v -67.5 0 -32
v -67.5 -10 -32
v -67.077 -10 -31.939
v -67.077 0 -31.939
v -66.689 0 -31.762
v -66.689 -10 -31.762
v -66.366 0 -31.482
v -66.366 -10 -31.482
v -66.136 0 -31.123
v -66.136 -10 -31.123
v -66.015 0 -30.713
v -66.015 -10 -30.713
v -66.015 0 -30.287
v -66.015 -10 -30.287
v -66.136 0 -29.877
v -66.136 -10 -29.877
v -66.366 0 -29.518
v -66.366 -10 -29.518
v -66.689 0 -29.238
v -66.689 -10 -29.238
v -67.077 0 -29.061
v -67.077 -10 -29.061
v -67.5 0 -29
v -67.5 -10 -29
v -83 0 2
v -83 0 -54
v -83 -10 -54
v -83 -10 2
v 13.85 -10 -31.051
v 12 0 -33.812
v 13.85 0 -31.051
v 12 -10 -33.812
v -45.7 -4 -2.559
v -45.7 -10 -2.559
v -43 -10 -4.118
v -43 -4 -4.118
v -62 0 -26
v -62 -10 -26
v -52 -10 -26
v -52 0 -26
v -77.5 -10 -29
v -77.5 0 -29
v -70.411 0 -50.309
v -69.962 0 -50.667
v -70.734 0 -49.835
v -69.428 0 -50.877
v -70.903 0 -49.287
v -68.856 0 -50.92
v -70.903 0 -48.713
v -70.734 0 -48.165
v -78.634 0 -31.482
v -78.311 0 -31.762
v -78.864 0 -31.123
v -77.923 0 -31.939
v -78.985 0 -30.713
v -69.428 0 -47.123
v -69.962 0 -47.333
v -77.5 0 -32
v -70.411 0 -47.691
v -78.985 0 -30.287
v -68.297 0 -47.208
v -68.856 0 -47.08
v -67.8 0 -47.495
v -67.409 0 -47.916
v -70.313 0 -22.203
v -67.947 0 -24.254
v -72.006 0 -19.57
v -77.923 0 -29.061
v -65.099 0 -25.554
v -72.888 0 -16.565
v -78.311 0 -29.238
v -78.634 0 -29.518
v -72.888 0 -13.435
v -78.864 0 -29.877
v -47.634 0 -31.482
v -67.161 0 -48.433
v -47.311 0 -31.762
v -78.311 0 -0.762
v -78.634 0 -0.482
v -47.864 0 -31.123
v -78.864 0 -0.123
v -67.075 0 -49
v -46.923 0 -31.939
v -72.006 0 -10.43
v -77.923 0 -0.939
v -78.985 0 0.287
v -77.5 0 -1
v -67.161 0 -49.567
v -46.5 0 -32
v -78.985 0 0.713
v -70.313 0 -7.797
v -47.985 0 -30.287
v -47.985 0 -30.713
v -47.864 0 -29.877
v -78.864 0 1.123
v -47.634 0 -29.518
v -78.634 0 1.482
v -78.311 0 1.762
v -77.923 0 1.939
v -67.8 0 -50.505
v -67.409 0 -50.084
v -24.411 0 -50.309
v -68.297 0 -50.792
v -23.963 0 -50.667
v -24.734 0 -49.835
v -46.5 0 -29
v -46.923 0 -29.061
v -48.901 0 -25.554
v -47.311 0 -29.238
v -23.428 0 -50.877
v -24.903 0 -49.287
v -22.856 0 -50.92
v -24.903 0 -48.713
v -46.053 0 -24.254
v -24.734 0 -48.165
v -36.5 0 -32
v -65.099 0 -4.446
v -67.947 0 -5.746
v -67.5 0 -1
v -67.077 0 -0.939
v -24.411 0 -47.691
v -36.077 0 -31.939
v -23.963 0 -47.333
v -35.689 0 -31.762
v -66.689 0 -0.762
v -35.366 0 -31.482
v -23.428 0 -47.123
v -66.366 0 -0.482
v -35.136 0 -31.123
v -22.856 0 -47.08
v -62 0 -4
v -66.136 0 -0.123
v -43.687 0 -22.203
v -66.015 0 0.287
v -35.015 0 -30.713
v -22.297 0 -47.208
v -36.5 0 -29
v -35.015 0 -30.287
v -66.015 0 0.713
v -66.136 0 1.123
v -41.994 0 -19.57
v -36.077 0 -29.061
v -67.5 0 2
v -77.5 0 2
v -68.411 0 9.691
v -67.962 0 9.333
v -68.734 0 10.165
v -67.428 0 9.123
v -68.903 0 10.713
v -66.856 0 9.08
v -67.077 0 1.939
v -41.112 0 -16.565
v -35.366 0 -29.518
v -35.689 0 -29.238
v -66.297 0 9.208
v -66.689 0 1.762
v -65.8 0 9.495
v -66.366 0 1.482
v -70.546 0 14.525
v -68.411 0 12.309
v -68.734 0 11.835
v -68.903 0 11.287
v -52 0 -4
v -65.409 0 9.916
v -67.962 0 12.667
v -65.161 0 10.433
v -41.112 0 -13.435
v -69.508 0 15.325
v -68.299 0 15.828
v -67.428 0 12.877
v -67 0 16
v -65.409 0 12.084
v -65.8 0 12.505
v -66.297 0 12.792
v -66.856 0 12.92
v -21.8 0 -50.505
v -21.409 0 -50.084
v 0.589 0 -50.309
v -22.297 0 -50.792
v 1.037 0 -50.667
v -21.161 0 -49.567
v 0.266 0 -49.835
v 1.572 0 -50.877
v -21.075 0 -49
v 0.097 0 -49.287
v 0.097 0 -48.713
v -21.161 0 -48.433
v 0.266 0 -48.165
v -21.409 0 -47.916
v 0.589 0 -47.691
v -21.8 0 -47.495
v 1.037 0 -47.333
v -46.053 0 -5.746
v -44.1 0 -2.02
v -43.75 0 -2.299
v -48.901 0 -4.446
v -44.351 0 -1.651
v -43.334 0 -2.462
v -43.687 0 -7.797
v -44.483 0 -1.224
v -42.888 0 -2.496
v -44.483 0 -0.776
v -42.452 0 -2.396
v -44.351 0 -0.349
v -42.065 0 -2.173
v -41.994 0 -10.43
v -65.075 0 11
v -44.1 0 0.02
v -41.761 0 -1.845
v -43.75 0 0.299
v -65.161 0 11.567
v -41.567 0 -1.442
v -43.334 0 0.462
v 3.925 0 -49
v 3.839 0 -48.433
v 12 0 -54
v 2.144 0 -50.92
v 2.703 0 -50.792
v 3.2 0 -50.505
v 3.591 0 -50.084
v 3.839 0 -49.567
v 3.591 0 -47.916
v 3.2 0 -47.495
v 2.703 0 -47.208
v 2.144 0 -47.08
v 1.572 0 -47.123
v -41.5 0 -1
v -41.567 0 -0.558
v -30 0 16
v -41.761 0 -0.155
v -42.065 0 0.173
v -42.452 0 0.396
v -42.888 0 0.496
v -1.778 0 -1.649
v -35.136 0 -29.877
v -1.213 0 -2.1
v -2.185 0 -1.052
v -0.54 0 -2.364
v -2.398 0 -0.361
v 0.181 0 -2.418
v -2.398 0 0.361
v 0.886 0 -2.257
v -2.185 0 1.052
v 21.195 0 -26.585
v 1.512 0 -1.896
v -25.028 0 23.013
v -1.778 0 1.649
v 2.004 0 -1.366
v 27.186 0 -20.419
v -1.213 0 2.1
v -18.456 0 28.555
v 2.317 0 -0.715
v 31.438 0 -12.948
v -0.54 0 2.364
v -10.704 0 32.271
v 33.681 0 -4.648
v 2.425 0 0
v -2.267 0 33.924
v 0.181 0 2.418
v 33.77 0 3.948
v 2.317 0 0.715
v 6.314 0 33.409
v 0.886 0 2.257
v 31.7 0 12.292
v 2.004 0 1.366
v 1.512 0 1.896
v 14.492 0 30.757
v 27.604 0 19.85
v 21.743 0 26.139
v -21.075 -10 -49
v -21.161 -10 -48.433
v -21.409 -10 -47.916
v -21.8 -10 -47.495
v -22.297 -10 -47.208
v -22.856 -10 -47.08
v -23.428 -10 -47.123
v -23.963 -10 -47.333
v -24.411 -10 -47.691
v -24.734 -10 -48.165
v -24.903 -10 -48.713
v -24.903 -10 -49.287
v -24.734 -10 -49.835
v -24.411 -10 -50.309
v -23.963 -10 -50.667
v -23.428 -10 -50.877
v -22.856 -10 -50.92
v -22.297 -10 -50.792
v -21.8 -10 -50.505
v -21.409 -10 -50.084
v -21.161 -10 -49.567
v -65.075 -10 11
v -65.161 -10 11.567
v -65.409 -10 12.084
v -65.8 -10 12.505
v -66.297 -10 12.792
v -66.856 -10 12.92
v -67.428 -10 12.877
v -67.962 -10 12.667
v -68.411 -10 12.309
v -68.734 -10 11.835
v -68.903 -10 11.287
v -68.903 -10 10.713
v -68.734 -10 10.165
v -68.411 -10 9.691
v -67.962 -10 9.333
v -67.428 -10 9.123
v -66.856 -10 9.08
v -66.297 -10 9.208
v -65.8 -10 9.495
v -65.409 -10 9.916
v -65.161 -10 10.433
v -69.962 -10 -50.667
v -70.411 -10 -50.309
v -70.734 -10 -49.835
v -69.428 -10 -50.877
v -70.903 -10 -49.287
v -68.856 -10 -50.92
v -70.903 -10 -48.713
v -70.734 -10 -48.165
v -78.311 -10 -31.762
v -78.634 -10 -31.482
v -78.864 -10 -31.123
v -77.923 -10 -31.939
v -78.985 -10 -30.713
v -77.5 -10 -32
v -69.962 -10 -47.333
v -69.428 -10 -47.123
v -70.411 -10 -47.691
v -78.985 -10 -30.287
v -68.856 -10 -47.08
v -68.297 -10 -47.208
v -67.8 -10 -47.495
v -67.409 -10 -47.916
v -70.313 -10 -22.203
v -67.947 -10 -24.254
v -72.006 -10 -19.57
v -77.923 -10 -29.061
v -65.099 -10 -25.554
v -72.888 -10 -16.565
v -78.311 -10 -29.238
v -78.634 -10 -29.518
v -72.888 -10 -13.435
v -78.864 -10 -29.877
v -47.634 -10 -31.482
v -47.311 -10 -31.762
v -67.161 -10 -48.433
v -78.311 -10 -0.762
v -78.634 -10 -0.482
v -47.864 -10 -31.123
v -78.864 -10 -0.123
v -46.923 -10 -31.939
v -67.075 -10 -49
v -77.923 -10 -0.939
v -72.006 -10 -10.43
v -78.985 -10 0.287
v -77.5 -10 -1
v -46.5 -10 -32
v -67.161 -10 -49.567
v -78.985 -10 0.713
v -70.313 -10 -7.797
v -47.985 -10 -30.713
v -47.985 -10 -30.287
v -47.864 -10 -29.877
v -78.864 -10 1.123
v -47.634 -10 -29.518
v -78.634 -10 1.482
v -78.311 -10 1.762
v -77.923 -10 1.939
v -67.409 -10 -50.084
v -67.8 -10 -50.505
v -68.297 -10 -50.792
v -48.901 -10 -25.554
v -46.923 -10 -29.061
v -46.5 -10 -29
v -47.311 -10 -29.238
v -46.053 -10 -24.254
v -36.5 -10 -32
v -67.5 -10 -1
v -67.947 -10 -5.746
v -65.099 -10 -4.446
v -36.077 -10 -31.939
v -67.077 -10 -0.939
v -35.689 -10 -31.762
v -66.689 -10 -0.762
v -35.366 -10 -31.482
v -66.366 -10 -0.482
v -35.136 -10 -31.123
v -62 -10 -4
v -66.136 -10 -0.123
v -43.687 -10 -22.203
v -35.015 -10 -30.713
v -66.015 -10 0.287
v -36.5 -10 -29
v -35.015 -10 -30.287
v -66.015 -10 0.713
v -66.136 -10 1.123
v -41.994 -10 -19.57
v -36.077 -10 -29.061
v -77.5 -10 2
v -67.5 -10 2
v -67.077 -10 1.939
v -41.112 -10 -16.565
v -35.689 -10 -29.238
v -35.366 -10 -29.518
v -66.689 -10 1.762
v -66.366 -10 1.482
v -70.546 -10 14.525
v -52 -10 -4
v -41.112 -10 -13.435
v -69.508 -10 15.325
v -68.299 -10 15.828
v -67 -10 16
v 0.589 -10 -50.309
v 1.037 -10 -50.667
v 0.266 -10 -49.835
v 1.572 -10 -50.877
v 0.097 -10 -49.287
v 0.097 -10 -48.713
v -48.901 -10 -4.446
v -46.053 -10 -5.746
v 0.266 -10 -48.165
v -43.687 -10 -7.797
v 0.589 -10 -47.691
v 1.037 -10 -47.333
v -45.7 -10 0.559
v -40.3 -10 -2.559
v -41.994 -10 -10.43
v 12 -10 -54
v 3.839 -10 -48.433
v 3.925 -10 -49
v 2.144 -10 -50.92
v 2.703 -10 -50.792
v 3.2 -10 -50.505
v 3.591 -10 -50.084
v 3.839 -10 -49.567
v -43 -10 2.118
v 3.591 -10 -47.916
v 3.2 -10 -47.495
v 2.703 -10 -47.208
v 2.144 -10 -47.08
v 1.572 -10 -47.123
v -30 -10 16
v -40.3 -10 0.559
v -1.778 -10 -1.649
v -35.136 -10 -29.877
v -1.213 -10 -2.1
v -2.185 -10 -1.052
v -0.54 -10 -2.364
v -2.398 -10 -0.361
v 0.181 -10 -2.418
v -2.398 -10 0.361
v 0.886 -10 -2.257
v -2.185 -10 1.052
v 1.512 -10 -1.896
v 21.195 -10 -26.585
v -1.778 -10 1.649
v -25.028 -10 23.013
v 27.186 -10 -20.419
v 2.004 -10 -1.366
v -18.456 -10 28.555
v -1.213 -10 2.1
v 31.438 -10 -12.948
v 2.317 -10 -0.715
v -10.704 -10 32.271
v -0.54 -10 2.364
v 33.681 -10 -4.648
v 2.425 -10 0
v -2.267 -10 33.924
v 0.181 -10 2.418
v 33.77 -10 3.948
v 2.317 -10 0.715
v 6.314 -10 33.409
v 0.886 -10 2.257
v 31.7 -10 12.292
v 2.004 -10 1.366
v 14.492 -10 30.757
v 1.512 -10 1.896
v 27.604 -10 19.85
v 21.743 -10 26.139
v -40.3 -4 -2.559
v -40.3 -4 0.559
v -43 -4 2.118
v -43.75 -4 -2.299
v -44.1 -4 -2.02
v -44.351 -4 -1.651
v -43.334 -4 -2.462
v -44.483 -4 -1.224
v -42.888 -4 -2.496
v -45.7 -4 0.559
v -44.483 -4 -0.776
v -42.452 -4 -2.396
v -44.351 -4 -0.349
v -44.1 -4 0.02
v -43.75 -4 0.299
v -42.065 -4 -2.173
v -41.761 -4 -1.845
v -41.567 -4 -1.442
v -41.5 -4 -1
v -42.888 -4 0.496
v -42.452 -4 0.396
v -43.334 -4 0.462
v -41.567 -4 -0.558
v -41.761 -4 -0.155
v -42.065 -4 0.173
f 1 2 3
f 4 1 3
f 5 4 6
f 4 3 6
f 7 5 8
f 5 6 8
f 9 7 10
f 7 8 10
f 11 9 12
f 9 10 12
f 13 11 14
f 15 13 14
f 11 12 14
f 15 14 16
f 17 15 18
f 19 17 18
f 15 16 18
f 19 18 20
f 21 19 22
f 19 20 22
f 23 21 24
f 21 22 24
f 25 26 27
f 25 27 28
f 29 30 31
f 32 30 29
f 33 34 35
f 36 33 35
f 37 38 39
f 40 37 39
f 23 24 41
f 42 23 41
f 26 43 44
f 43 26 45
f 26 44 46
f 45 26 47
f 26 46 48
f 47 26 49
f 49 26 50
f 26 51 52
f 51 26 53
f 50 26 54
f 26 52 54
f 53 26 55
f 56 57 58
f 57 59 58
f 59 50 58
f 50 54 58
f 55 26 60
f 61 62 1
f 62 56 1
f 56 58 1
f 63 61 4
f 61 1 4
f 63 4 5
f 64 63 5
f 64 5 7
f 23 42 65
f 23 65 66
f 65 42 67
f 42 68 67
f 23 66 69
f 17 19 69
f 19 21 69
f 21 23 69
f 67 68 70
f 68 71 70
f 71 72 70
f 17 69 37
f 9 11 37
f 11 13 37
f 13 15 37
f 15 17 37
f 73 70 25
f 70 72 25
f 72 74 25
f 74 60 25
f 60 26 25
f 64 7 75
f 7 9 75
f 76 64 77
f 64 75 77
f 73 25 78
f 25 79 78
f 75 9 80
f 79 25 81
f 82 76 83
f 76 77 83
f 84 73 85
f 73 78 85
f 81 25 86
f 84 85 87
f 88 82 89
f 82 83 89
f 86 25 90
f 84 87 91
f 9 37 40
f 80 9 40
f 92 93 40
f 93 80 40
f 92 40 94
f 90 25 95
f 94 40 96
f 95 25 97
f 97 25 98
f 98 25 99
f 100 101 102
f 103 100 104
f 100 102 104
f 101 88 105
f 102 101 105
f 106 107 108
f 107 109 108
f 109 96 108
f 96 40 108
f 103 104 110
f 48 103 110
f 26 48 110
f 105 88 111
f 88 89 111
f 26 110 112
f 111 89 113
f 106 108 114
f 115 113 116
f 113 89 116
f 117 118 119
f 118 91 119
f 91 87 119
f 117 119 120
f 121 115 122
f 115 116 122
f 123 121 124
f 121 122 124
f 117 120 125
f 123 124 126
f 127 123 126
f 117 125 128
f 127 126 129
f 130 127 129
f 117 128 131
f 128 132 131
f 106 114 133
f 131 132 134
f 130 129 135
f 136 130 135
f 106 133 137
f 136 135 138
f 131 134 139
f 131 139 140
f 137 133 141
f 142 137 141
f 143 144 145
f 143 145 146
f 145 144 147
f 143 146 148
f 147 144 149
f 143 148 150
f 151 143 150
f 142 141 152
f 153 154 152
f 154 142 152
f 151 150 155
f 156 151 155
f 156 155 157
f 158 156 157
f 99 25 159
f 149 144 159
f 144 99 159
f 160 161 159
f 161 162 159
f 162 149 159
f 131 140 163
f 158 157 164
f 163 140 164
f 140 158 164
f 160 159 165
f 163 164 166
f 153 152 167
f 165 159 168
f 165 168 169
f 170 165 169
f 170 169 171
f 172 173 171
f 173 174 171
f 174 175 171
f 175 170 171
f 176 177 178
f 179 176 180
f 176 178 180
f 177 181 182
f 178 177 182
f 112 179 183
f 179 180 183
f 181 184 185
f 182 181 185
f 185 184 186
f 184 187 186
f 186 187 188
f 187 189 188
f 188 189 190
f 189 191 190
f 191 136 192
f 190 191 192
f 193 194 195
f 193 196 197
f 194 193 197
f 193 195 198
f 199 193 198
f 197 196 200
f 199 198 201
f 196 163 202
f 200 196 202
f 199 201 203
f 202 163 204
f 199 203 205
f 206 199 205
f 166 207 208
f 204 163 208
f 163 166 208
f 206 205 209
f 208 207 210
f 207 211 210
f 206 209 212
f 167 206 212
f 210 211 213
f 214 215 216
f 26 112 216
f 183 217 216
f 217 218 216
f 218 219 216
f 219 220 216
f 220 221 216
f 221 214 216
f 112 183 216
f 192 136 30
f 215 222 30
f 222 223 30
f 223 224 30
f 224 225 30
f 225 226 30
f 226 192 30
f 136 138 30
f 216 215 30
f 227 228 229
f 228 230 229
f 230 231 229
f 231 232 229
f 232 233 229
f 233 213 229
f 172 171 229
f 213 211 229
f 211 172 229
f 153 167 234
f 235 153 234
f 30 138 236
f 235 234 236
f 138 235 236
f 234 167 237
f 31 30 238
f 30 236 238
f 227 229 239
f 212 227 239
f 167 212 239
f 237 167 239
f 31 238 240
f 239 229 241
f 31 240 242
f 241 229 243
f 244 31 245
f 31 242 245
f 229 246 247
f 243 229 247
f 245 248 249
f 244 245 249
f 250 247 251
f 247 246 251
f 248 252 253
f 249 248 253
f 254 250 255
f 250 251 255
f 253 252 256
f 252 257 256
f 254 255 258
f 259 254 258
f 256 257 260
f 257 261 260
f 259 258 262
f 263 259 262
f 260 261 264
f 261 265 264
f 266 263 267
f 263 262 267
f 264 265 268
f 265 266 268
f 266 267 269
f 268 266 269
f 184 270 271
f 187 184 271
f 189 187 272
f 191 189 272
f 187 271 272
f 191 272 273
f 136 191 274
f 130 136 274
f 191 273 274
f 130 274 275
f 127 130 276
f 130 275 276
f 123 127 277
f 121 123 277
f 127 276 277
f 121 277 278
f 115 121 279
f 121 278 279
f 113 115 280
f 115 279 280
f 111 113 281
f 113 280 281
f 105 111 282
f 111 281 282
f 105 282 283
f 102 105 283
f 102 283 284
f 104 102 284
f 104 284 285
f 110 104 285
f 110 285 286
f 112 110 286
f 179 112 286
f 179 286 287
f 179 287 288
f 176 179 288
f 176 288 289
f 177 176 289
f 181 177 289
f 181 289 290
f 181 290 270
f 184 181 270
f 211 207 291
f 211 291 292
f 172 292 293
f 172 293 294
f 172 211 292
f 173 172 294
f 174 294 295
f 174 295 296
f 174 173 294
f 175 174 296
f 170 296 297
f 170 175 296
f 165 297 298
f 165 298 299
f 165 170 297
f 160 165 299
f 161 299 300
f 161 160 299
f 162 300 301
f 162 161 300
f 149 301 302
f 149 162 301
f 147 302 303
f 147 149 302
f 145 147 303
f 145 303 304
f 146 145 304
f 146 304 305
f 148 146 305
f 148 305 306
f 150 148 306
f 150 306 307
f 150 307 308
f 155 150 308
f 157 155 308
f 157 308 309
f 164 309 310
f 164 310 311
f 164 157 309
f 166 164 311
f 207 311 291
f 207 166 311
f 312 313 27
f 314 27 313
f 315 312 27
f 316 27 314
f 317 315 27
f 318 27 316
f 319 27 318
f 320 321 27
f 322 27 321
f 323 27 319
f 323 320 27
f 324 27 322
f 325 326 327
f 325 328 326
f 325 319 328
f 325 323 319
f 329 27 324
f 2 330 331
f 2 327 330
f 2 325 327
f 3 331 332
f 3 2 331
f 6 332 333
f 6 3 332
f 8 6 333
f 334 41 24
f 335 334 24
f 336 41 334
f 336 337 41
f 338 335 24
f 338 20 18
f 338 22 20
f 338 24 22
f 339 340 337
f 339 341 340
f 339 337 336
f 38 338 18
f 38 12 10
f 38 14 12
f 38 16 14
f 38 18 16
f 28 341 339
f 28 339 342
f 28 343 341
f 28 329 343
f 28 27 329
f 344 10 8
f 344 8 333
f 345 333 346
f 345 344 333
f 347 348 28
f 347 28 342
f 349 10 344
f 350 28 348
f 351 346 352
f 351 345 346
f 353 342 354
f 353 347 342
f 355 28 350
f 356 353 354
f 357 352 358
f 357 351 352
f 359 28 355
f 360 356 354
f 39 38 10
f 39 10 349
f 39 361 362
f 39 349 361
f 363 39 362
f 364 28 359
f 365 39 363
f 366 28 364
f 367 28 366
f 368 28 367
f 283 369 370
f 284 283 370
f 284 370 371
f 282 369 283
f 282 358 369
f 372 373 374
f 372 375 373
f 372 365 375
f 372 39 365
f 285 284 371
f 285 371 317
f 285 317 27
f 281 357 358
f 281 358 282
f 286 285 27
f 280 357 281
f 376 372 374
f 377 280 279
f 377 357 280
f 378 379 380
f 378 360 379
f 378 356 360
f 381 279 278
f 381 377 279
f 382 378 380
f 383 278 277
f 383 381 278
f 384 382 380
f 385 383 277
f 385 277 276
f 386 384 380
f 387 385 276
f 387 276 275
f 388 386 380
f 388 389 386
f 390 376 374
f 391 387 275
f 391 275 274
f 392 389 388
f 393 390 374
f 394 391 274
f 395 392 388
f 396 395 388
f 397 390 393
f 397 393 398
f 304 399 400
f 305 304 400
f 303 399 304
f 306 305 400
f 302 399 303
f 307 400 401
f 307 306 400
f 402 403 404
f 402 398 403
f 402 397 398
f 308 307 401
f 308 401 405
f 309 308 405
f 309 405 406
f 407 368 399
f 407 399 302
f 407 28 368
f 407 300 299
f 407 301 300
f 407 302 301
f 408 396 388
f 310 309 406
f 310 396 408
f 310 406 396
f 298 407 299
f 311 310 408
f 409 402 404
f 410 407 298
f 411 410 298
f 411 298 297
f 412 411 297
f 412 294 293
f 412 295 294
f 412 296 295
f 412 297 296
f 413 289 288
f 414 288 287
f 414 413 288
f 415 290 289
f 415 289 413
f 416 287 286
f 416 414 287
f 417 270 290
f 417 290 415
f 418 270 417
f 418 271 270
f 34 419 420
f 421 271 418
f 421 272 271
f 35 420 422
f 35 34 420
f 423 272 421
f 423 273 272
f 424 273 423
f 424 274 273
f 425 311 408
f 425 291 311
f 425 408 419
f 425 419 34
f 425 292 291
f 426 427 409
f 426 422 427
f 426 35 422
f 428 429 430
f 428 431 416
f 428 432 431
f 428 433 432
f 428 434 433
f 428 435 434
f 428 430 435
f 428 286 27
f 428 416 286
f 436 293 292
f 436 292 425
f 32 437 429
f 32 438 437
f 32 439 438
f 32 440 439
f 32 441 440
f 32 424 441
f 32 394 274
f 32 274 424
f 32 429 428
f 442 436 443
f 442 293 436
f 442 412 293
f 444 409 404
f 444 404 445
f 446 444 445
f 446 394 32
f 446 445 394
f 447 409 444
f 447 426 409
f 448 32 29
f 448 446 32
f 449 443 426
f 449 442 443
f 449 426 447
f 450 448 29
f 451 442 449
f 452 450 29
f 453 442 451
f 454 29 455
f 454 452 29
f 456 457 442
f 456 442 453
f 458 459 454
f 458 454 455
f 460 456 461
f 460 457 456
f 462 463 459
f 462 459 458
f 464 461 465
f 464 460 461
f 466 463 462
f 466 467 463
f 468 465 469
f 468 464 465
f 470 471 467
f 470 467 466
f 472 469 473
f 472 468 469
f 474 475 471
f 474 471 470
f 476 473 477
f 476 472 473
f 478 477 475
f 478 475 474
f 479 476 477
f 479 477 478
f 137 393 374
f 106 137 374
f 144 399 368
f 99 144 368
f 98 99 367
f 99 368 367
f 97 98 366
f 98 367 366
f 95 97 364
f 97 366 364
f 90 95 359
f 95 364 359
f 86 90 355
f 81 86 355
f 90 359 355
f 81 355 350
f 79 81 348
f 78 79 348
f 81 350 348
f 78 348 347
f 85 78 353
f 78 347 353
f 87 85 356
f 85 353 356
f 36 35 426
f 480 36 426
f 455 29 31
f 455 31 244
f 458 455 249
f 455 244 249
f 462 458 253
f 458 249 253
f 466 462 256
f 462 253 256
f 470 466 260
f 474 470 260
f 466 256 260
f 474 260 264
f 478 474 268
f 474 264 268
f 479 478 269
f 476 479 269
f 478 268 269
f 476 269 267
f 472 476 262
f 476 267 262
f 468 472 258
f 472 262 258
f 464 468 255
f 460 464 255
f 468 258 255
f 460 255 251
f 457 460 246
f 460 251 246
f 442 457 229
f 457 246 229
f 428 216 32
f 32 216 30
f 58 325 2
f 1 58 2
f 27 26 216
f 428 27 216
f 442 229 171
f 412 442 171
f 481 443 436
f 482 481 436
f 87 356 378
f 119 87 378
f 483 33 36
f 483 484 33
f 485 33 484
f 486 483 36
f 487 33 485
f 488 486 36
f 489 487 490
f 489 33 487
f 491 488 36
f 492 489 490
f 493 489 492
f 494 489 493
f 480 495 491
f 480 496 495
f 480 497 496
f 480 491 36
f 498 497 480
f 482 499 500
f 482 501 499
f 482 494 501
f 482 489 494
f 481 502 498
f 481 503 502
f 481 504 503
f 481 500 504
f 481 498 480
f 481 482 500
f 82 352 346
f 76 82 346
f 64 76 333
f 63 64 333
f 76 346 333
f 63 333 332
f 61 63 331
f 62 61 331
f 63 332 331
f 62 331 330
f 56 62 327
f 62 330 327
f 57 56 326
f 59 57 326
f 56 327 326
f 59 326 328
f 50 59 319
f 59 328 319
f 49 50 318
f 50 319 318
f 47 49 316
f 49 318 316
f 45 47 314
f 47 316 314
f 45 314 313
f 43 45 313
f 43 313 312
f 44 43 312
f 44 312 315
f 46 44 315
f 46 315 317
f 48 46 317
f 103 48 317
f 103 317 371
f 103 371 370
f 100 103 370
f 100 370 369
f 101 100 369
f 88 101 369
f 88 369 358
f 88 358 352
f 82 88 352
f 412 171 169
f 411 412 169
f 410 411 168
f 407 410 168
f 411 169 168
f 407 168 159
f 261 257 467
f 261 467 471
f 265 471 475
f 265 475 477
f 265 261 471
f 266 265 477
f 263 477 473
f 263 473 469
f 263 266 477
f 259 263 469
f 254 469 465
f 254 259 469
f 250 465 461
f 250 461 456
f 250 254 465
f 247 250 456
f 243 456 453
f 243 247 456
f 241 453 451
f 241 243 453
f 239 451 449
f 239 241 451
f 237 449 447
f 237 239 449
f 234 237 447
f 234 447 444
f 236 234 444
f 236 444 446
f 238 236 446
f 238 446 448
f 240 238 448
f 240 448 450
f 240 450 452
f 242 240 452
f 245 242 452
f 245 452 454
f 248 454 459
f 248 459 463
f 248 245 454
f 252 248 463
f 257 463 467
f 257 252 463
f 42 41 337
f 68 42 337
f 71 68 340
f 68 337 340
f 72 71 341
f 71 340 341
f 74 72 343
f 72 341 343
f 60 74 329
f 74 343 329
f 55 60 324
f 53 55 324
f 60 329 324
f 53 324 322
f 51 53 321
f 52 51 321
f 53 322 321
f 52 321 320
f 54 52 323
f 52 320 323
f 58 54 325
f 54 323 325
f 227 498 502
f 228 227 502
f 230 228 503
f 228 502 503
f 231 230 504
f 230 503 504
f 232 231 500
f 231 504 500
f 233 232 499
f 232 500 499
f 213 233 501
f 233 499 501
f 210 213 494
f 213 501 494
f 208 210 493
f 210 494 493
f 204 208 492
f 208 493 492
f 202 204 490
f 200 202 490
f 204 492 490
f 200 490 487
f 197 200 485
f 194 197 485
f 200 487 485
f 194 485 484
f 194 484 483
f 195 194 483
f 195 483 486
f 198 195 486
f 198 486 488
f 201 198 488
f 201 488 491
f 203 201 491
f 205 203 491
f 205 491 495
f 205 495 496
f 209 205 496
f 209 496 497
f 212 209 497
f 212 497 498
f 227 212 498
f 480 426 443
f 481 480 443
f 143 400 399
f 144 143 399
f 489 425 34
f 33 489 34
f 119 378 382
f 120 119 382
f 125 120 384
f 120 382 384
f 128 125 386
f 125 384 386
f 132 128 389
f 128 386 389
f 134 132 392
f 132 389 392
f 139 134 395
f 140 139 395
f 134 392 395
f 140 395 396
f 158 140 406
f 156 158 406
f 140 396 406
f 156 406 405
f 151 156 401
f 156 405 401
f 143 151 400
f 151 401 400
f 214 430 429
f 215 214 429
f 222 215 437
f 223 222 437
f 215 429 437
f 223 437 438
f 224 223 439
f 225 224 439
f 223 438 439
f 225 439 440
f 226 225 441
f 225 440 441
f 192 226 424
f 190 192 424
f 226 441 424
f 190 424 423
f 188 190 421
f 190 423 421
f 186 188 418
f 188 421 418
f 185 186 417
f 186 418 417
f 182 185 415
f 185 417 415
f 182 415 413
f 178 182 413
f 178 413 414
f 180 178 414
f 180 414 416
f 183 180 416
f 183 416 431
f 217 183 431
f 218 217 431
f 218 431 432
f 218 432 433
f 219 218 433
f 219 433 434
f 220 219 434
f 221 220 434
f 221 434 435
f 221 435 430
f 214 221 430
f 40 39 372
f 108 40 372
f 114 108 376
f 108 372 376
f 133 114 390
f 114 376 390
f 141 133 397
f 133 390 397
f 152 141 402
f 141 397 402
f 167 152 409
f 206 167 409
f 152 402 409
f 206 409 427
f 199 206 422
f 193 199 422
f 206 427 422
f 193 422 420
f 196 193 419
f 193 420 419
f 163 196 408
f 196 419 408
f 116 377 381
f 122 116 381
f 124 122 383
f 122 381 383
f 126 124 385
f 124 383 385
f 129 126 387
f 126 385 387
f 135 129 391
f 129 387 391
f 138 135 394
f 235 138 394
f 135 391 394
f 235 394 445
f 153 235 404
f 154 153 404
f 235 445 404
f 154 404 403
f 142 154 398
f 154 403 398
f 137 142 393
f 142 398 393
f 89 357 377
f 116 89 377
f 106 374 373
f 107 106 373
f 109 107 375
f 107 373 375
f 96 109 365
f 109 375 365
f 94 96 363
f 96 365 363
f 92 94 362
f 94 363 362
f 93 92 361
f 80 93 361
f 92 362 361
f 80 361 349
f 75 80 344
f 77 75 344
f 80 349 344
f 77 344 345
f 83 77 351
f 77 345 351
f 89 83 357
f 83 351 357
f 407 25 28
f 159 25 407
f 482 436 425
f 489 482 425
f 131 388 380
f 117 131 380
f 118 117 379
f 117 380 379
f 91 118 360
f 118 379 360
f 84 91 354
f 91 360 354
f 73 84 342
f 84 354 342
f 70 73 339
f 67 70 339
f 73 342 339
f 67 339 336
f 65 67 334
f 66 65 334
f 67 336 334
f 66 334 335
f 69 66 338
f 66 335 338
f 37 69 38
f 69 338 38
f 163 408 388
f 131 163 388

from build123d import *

# Parameters (mm, degrees)
SKETCH_R        = 2.425
SKETCH_R_2      = 1.925
PAD_DEPTH       = 10
POCKET_DEPTH    = 12
SKETCH002_R     = 1.925
POCKET001_DEPTH = 12
SKETCH003_R     = 1.5
POCKET002_DEPTH = 12
POCKET003_DEPTH = 6
CHAMFER_SIZE    = 2


with BuildPart() as part:
    # Sketch → Pad (new body)
    with BuildSketch(Plane.XZ):
        with BuildLine():
            ThreePointArc((12, -31.811947), (25.543993, 22.438904), (-30, 16))
            Line((-30, 16), (-67, 16))
            ThreePointArc((-67, 16), (-68.919984, 15.616672), (-70.545574, 14.525465))
            Line((-83, 2), (-70.545574, 14.525465))
            Line((-83, -54), (-83, 2))
            Line((-83, -54), (12, -54))
            Line((12, -54), (12, -31.811947))
        make_face()
        Circle(SKETCH_R, mode=Mode.SUBTRACT)
        with Locations((-67, 11)):
            Circle(SKETCH_R_2, mode=Mode.SUBTRACT)
    extrude(amount=PAD_DEPTH)

    # Sketch001 (on Face11 of Pad) → Pocket (cut)
    with BuildSketch(Plane.XZ.offset(10)):
        with BuildLine():
            ThreePointArc((-62, -4), (-73, -15), (-62, -26))
            Line((-62, -26), (-52, -26))
            ThreePointArc((-52, -26), (-41, -15), (-52, -4))
            Line((-52, -4), (-62, -4))
        make_face()
        with BuildLine():
            ThreePointArc((-77.5, 2), (-79, 0.5), (-77.5, -1))
            Line((-77.5, -1), (-67.5, -1))
            ThreePointArc((-67.5, -1), (-66, 0.5), (-67.5, 2))
            Line((-67.5, 2), (-77.5, 2))
        make_face()
        with BuildLine():
            ThreePointArc((-77.5, -29), (-79, -30.5), (-77.5, -32))
            Line((-77.5, -32), (-67.5, -32))
            ThreePointArc((-67.5, -32), (-66, -30.5), (-67.5, -29))
            Line((-67.5, -29), (-77.5, -29))
        make_face()
        with BuildLine():
            ThreePointArc((-46.5, -29), (-48, -30.5), (-46.5, -32))
            Line((-46.5, -32), (-36.5, -32))
            ThreePointArc((-36.5, -32), (-35, -30.5), (-36.5, -29))
            Line((-36.5, -29), (-46.5, -29))
        make_face()
    extrude(amount=-POCKET_DEPTH, mode=Mode.SUBTRACT)

    # Sketch002 (on Face5 of Pocket) → Pocket001 (cut)
    with BuildSketch(Plane.XZ.offset(10)):
        with Locations((-69, -49)):
            Circle(SKETCH002_R)
        with Locations((-23, -49)):
            Circle(SKETCH002_R)
        with Locations((2, -49)):
            Circle(SKETCH002_R)
    extrude(amount=-POCKET001_DEPTH, mode=Mode.SUBTRACT)

    # Sketch003 (on Face5 of Pocket001) → Pocket002 (cut)
    with BuildSketch(Plane.XZ.offset(10)):
        with Locations((-43, -1)):
            Circle(SKETCH003_R)
    extrude(amount=-POCKET002_DEPTH, mode=Mode.SUBTRACT)

    # Sketch004 (on Face5 of Pocket002) → Pocket003 (cut)
    with BuildSketch(Plane.XZ.offset(10)):
        Polygon((-43, -4.117691), (-40.3, -2.558846), (-40.3, 0.558846), (-43, 2.117691), (-45.7, 0.558846), (-45.7, -2.558846), align=None)
    extrude(amount=-POCKET003_DEPTH, mode=Mode.SUBTRACT)

    # Chamfer
    chamfer_edges = [part.edges().sort_by_distance(p)[0] for p in [
        (12, -5, -31.811947),
    ]]
    chamfer(chamfer_edges, length=CHAMFER_SIZE)


solid = part.part
